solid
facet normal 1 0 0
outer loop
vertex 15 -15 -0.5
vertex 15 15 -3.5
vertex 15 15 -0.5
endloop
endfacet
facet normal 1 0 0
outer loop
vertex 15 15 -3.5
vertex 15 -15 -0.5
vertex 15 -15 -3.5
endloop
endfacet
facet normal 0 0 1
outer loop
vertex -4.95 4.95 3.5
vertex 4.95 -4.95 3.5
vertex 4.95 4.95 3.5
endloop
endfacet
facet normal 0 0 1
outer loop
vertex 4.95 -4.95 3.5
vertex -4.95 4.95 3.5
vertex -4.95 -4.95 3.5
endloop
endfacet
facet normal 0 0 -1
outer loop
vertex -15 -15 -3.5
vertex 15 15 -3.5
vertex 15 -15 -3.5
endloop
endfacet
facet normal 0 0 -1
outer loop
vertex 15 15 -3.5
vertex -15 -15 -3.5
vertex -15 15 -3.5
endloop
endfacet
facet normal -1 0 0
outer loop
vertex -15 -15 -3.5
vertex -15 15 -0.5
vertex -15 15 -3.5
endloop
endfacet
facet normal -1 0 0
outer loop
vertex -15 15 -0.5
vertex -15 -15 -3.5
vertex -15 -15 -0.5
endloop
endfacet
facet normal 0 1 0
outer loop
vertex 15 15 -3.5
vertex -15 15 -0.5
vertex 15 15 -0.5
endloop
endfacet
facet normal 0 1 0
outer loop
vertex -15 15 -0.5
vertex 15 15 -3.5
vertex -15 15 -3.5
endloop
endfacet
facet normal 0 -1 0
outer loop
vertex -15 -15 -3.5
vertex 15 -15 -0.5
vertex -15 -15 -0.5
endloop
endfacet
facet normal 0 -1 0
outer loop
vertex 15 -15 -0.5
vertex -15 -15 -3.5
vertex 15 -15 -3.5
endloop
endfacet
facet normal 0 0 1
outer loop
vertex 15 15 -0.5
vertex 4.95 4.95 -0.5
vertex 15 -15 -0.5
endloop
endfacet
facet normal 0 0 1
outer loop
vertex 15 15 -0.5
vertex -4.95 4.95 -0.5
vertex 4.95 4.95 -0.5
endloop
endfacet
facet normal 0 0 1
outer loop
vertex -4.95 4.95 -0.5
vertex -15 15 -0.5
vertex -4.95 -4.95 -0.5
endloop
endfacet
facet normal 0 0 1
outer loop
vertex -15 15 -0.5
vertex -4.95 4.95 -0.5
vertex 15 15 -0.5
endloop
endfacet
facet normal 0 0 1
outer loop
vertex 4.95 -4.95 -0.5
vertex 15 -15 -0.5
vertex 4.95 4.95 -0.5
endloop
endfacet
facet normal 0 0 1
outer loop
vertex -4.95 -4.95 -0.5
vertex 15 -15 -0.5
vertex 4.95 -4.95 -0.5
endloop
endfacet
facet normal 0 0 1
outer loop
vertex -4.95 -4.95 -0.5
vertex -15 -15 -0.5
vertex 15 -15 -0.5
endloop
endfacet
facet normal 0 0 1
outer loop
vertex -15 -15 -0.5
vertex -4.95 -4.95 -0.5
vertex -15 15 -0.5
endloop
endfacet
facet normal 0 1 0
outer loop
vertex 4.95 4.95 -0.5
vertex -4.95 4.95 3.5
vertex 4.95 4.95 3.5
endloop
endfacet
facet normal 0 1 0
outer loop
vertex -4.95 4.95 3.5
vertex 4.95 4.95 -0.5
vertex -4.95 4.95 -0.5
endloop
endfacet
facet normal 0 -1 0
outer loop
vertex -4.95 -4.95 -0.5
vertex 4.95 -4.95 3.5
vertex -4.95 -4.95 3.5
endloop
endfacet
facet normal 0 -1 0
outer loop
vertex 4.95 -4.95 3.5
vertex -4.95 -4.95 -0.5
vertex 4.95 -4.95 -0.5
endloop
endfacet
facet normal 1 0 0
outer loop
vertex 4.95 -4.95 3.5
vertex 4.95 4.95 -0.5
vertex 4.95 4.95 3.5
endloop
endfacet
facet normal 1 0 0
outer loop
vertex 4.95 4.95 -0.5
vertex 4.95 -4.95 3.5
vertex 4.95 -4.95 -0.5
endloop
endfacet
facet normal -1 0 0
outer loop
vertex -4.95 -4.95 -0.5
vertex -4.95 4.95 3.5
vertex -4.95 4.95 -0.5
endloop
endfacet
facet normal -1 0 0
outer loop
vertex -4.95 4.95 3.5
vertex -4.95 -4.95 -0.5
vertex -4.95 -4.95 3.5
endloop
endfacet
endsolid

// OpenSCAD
//Glossary
//ttl = total

// the total depth of the cap cube to be reduced
d_ttl_cap=7;
// the total length of the cap cube
l_ttl_cap=30;
difference(){
color("black")
    //Cube
    cube([l_ttl_cap,l_ttl_cap,d_ttl_cap], center=true);
     // Cylinder 1
    translate([0,10,2])
    cube([30.1,10.1,5],center=true);
    translate([0,-10,2])
    cube([30.1,10.1,5],center=true);
        translate([10,0,2])
    cube([10.1,10.1,5],center=true);
            translate([-10,0,2])
    cube([10.1,10.1,5],center=true);
    }
